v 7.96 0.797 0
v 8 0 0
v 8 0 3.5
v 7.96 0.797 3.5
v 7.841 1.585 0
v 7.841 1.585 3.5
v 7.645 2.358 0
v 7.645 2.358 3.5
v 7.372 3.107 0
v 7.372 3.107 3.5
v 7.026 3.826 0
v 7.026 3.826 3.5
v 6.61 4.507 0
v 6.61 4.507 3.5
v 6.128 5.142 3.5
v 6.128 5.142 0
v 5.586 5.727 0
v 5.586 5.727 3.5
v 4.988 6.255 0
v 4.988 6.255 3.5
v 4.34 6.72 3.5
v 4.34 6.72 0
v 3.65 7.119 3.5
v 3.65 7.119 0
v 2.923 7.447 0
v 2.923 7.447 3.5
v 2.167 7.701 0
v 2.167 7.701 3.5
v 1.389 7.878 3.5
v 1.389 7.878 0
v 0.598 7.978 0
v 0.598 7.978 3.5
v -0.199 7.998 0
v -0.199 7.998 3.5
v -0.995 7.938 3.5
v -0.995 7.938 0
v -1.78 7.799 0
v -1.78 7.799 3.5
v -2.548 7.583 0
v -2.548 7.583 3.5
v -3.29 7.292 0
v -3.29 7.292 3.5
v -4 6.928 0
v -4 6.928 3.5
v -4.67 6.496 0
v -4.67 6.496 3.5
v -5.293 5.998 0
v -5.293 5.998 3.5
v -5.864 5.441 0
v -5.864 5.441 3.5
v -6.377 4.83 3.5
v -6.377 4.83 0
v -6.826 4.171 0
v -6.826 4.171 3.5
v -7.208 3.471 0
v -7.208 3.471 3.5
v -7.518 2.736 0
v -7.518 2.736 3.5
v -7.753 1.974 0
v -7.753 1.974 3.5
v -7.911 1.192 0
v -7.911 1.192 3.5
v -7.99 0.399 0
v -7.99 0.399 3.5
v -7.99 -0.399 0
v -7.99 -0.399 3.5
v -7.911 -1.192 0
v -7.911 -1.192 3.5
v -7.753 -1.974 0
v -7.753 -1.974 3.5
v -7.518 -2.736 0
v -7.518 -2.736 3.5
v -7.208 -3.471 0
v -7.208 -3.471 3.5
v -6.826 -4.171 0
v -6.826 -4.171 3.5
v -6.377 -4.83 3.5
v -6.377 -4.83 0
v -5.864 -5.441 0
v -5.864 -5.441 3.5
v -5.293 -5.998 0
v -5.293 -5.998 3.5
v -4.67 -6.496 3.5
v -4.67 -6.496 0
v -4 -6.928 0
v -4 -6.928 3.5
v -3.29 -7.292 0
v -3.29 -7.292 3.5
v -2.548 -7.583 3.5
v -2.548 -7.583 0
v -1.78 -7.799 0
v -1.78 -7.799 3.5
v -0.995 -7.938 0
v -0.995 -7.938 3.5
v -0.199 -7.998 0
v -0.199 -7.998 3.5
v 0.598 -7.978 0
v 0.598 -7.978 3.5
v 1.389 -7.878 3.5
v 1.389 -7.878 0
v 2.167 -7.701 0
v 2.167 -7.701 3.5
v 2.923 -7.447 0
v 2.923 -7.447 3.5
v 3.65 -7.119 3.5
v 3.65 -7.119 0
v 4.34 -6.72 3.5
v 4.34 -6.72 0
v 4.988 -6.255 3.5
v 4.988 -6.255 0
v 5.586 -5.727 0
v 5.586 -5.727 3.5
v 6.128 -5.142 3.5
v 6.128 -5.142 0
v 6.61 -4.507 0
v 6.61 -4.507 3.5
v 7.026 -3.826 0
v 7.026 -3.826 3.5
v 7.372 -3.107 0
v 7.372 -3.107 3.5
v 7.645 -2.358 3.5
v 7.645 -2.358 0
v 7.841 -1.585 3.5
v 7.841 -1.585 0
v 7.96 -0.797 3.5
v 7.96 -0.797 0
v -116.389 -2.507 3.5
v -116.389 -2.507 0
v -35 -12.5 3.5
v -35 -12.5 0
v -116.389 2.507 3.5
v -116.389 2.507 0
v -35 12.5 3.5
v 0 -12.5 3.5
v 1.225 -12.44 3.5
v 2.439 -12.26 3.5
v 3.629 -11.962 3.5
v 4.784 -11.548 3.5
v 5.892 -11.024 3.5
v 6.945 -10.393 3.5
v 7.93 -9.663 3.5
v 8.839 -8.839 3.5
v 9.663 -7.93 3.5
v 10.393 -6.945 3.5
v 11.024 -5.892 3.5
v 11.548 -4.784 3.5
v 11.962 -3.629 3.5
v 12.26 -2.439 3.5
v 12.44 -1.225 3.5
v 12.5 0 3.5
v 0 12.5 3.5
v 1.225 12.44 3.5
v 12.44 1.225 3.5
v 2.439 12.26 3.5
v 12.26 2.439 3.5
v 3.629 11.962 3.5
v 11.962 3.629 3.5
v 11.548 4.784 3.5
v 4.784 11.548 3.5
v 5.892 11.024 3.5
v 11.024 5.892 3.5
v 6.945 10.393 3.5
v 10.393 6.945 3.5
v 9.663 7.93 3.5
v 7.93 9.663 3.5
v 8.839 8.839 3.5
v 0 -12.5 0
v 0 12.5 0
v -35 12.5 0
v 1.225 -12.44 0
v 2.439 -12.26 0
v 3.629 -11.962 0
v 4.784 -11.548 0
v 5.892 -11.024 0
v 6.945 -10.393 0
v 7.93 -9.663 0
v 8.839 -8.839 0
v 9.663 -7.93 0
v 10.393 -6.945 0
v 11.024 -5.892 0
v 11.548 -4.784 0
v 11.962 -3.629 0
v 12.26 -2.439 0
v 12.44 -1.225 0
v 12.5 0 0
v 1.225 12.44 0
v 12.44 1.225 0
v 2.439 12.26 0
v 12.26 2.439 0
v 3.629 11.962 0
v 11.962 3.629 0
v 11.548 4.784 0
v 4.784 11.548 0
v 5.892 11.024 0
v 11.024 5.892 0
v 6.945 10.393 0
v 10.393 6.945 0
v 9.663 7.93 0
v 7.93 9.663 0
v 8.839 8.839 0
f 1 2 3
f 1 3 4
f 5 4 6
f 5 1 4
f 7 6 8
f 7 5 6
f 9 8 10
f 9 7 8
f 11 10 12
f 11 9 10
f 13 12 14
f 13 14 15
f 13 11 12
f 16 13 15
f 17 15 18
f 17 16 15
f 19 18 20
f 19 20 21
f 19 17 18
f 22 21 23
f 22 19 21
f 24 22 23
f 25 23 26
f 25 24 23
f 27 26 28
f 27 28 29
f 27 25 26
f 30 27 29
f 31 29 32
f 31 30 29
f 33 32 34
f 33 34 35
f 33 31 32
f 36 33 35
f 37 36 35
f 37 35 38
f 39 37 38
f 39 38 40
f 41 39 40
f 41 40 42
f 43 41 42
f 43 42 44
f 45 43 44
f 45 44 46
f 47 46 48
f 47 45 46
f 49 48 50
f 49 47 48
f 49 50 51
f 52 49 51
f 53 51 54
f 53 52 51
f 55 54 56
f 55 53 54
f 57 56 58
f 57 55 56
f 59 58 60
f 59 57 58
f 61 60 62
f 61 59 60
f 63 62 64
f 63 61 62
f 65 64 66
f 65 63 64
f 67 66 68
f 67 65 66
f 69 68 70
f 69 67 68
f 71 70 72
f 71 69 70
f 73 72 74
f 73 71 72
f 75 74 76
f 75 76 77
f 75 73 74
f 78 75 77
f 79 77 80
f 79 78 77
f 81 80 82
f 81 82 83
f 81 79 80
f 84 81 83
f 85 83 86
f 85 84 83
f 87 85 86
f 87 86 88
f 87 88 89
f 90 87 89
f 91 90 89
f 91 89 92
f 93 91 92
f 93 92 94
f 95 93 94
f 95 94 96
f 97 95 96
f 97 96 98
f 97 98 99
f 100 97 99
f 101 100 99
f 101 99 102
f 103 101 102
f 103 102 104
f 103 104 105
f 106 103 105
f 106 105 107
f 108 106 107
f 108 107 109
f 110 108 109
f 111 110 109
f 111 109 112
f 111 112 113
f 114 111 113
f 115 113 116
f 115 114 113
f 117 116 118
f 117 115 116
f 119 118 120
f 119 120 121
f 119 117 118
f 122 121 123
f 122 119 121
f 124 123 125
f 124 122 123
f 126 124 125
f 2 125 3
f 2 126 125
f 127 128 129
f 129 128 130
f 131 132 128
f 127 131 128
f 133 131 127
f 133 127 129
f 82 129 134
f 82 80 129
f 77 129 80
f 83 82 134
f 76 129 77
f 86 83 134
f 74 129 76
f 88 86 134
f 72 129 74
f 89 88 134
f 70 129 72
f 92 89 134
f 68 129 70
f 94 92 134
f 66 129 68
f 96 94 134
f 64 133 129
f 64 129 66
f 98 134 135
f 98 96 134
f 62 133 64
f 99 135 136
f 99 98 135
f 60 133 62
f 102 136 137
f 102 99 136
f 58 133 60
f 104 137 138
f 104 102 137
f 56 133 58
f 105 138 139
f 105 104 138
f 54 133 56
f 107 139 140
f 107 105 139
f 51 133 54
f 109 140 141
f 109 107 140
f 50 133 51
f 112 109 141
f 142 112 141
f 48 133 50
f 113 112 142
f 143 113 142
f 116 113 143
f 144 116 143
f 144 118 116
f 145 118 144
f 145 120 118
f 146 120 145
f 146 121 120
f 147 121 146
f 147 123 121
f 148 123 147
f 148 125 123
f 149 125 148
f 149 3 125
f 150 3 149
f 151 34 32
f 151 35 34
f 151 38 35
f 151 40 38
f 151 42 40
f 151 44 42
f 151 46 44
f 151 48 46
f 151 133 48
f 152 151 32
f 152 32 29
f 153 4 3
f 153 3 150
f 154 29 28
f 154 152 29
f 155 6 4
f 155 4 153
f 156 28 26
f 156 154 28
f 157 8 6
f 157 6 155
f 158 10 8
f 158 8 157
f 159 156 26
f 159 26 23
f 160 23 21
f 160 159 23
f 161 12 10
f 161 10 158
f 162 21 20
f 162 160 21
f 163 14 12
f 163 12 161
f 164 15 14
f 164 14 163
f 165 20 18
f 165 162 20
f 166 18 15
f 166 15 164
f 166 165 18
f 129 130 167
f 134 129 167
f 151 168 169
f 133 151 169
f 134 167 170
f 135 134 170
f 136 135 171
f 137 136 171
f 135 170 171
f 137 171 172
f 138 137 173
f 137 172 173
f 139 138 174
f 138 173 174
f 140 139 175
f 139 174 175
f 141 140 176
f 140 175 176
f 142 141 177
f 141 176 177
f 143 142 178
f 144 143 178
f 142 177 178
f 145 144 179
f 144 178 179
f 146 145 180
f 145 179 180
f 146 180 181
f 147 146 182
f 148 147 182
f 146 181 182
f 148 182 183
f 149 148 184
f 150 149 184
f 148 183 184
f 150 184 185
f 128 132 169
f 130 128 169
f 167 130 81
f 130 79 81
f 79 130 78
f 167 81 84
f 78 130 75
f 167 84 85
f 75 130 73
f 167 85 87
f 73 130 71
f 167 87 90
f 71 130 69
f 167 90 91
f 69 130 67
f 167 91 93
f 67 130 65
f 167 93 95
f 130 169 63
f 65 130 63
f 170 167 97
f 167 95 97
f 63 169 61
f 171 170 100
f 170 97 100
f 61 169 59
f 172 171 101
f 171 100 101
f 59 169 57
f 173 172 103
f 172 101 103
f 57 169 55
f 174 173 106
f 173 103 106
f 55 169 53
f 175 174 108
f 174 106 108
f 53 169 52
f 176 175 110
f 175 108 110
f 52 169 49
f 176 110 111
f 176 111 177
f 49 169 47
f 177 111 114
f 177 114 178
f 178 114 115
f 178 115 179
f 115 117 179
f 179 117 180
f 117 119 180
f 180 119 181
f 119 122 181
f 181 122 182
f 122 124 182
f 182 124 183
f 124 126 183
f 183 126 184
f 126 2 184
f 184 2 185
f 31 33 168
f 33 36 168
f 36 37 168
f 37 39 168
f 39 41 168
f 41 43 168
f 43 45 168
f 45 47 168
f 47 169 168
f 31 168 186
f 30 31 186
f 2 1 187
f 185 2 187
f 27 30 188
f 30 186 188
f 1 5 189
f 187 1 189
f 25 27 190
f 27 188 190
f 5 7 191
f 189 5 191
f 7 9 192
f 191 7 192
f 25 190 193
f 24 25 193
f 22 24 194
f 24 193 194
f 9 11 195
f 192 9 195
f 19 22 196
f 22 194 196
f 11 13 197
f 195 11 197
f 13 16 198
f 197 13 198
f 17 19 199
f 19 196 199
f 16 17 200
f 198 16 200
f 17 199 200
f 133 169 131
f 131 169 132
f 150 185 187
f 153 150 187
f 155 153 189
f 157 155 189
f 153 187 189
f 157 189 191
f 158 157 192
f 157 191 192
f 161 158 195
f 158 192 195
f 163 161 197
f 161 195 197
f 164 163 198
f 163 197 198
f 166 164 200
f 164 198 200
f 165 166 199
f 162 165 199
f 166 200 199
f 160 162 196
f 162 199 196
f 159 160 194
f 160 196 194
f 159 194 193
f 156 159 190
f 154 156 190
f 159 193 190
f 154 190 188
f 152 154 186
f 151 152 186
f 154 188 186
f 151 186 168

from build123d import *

# Parameters (mm, degrees)
F0_R     = 8
F1_DEPTH = 3.5


# Not quite as in the source:
# - the program builds the solid bodies; features that only make, move or delete a surface that nothing else refers to are left out


with BuildPart() as f1:
    # F0 (on Top) → F1 (new body)
    with BuildSketch(Plane.XY):
        with BuildLine():
            ThreePointArc((0, -12.5), (-12.5, 0), (0, 12.5))
            Line((0, 12.5), (-35, 12.5))
            Line((-35, 12.5), (-116.3887844346, 2.5067138408))
            Line((-116.3887844346, 2.5067138408), (-116.3887844346, -2.5067138408))
            Line((-116.3887844346, -2.5067138408), (-35, -12.5))
            Line((-35, -12.5), (0, -12.5))
        make_face()
        with BuildLine():
            ThreePointArc((0, -12.5), (8.8388347648, -8.8388347648), (12.5, 0))
            ThreePointArc((12.5, 0), (8.8388347648, 8.8388347648), (0, 12.5))
            ThreePointArc((0, 12.5), (-12.5, 0), (0, -12.5))
        make_face()
        Circle(F0_R, mode=Mode.SUBTRACT)
    extrude(amount=F1_DEPTH)


solid = f1.part
